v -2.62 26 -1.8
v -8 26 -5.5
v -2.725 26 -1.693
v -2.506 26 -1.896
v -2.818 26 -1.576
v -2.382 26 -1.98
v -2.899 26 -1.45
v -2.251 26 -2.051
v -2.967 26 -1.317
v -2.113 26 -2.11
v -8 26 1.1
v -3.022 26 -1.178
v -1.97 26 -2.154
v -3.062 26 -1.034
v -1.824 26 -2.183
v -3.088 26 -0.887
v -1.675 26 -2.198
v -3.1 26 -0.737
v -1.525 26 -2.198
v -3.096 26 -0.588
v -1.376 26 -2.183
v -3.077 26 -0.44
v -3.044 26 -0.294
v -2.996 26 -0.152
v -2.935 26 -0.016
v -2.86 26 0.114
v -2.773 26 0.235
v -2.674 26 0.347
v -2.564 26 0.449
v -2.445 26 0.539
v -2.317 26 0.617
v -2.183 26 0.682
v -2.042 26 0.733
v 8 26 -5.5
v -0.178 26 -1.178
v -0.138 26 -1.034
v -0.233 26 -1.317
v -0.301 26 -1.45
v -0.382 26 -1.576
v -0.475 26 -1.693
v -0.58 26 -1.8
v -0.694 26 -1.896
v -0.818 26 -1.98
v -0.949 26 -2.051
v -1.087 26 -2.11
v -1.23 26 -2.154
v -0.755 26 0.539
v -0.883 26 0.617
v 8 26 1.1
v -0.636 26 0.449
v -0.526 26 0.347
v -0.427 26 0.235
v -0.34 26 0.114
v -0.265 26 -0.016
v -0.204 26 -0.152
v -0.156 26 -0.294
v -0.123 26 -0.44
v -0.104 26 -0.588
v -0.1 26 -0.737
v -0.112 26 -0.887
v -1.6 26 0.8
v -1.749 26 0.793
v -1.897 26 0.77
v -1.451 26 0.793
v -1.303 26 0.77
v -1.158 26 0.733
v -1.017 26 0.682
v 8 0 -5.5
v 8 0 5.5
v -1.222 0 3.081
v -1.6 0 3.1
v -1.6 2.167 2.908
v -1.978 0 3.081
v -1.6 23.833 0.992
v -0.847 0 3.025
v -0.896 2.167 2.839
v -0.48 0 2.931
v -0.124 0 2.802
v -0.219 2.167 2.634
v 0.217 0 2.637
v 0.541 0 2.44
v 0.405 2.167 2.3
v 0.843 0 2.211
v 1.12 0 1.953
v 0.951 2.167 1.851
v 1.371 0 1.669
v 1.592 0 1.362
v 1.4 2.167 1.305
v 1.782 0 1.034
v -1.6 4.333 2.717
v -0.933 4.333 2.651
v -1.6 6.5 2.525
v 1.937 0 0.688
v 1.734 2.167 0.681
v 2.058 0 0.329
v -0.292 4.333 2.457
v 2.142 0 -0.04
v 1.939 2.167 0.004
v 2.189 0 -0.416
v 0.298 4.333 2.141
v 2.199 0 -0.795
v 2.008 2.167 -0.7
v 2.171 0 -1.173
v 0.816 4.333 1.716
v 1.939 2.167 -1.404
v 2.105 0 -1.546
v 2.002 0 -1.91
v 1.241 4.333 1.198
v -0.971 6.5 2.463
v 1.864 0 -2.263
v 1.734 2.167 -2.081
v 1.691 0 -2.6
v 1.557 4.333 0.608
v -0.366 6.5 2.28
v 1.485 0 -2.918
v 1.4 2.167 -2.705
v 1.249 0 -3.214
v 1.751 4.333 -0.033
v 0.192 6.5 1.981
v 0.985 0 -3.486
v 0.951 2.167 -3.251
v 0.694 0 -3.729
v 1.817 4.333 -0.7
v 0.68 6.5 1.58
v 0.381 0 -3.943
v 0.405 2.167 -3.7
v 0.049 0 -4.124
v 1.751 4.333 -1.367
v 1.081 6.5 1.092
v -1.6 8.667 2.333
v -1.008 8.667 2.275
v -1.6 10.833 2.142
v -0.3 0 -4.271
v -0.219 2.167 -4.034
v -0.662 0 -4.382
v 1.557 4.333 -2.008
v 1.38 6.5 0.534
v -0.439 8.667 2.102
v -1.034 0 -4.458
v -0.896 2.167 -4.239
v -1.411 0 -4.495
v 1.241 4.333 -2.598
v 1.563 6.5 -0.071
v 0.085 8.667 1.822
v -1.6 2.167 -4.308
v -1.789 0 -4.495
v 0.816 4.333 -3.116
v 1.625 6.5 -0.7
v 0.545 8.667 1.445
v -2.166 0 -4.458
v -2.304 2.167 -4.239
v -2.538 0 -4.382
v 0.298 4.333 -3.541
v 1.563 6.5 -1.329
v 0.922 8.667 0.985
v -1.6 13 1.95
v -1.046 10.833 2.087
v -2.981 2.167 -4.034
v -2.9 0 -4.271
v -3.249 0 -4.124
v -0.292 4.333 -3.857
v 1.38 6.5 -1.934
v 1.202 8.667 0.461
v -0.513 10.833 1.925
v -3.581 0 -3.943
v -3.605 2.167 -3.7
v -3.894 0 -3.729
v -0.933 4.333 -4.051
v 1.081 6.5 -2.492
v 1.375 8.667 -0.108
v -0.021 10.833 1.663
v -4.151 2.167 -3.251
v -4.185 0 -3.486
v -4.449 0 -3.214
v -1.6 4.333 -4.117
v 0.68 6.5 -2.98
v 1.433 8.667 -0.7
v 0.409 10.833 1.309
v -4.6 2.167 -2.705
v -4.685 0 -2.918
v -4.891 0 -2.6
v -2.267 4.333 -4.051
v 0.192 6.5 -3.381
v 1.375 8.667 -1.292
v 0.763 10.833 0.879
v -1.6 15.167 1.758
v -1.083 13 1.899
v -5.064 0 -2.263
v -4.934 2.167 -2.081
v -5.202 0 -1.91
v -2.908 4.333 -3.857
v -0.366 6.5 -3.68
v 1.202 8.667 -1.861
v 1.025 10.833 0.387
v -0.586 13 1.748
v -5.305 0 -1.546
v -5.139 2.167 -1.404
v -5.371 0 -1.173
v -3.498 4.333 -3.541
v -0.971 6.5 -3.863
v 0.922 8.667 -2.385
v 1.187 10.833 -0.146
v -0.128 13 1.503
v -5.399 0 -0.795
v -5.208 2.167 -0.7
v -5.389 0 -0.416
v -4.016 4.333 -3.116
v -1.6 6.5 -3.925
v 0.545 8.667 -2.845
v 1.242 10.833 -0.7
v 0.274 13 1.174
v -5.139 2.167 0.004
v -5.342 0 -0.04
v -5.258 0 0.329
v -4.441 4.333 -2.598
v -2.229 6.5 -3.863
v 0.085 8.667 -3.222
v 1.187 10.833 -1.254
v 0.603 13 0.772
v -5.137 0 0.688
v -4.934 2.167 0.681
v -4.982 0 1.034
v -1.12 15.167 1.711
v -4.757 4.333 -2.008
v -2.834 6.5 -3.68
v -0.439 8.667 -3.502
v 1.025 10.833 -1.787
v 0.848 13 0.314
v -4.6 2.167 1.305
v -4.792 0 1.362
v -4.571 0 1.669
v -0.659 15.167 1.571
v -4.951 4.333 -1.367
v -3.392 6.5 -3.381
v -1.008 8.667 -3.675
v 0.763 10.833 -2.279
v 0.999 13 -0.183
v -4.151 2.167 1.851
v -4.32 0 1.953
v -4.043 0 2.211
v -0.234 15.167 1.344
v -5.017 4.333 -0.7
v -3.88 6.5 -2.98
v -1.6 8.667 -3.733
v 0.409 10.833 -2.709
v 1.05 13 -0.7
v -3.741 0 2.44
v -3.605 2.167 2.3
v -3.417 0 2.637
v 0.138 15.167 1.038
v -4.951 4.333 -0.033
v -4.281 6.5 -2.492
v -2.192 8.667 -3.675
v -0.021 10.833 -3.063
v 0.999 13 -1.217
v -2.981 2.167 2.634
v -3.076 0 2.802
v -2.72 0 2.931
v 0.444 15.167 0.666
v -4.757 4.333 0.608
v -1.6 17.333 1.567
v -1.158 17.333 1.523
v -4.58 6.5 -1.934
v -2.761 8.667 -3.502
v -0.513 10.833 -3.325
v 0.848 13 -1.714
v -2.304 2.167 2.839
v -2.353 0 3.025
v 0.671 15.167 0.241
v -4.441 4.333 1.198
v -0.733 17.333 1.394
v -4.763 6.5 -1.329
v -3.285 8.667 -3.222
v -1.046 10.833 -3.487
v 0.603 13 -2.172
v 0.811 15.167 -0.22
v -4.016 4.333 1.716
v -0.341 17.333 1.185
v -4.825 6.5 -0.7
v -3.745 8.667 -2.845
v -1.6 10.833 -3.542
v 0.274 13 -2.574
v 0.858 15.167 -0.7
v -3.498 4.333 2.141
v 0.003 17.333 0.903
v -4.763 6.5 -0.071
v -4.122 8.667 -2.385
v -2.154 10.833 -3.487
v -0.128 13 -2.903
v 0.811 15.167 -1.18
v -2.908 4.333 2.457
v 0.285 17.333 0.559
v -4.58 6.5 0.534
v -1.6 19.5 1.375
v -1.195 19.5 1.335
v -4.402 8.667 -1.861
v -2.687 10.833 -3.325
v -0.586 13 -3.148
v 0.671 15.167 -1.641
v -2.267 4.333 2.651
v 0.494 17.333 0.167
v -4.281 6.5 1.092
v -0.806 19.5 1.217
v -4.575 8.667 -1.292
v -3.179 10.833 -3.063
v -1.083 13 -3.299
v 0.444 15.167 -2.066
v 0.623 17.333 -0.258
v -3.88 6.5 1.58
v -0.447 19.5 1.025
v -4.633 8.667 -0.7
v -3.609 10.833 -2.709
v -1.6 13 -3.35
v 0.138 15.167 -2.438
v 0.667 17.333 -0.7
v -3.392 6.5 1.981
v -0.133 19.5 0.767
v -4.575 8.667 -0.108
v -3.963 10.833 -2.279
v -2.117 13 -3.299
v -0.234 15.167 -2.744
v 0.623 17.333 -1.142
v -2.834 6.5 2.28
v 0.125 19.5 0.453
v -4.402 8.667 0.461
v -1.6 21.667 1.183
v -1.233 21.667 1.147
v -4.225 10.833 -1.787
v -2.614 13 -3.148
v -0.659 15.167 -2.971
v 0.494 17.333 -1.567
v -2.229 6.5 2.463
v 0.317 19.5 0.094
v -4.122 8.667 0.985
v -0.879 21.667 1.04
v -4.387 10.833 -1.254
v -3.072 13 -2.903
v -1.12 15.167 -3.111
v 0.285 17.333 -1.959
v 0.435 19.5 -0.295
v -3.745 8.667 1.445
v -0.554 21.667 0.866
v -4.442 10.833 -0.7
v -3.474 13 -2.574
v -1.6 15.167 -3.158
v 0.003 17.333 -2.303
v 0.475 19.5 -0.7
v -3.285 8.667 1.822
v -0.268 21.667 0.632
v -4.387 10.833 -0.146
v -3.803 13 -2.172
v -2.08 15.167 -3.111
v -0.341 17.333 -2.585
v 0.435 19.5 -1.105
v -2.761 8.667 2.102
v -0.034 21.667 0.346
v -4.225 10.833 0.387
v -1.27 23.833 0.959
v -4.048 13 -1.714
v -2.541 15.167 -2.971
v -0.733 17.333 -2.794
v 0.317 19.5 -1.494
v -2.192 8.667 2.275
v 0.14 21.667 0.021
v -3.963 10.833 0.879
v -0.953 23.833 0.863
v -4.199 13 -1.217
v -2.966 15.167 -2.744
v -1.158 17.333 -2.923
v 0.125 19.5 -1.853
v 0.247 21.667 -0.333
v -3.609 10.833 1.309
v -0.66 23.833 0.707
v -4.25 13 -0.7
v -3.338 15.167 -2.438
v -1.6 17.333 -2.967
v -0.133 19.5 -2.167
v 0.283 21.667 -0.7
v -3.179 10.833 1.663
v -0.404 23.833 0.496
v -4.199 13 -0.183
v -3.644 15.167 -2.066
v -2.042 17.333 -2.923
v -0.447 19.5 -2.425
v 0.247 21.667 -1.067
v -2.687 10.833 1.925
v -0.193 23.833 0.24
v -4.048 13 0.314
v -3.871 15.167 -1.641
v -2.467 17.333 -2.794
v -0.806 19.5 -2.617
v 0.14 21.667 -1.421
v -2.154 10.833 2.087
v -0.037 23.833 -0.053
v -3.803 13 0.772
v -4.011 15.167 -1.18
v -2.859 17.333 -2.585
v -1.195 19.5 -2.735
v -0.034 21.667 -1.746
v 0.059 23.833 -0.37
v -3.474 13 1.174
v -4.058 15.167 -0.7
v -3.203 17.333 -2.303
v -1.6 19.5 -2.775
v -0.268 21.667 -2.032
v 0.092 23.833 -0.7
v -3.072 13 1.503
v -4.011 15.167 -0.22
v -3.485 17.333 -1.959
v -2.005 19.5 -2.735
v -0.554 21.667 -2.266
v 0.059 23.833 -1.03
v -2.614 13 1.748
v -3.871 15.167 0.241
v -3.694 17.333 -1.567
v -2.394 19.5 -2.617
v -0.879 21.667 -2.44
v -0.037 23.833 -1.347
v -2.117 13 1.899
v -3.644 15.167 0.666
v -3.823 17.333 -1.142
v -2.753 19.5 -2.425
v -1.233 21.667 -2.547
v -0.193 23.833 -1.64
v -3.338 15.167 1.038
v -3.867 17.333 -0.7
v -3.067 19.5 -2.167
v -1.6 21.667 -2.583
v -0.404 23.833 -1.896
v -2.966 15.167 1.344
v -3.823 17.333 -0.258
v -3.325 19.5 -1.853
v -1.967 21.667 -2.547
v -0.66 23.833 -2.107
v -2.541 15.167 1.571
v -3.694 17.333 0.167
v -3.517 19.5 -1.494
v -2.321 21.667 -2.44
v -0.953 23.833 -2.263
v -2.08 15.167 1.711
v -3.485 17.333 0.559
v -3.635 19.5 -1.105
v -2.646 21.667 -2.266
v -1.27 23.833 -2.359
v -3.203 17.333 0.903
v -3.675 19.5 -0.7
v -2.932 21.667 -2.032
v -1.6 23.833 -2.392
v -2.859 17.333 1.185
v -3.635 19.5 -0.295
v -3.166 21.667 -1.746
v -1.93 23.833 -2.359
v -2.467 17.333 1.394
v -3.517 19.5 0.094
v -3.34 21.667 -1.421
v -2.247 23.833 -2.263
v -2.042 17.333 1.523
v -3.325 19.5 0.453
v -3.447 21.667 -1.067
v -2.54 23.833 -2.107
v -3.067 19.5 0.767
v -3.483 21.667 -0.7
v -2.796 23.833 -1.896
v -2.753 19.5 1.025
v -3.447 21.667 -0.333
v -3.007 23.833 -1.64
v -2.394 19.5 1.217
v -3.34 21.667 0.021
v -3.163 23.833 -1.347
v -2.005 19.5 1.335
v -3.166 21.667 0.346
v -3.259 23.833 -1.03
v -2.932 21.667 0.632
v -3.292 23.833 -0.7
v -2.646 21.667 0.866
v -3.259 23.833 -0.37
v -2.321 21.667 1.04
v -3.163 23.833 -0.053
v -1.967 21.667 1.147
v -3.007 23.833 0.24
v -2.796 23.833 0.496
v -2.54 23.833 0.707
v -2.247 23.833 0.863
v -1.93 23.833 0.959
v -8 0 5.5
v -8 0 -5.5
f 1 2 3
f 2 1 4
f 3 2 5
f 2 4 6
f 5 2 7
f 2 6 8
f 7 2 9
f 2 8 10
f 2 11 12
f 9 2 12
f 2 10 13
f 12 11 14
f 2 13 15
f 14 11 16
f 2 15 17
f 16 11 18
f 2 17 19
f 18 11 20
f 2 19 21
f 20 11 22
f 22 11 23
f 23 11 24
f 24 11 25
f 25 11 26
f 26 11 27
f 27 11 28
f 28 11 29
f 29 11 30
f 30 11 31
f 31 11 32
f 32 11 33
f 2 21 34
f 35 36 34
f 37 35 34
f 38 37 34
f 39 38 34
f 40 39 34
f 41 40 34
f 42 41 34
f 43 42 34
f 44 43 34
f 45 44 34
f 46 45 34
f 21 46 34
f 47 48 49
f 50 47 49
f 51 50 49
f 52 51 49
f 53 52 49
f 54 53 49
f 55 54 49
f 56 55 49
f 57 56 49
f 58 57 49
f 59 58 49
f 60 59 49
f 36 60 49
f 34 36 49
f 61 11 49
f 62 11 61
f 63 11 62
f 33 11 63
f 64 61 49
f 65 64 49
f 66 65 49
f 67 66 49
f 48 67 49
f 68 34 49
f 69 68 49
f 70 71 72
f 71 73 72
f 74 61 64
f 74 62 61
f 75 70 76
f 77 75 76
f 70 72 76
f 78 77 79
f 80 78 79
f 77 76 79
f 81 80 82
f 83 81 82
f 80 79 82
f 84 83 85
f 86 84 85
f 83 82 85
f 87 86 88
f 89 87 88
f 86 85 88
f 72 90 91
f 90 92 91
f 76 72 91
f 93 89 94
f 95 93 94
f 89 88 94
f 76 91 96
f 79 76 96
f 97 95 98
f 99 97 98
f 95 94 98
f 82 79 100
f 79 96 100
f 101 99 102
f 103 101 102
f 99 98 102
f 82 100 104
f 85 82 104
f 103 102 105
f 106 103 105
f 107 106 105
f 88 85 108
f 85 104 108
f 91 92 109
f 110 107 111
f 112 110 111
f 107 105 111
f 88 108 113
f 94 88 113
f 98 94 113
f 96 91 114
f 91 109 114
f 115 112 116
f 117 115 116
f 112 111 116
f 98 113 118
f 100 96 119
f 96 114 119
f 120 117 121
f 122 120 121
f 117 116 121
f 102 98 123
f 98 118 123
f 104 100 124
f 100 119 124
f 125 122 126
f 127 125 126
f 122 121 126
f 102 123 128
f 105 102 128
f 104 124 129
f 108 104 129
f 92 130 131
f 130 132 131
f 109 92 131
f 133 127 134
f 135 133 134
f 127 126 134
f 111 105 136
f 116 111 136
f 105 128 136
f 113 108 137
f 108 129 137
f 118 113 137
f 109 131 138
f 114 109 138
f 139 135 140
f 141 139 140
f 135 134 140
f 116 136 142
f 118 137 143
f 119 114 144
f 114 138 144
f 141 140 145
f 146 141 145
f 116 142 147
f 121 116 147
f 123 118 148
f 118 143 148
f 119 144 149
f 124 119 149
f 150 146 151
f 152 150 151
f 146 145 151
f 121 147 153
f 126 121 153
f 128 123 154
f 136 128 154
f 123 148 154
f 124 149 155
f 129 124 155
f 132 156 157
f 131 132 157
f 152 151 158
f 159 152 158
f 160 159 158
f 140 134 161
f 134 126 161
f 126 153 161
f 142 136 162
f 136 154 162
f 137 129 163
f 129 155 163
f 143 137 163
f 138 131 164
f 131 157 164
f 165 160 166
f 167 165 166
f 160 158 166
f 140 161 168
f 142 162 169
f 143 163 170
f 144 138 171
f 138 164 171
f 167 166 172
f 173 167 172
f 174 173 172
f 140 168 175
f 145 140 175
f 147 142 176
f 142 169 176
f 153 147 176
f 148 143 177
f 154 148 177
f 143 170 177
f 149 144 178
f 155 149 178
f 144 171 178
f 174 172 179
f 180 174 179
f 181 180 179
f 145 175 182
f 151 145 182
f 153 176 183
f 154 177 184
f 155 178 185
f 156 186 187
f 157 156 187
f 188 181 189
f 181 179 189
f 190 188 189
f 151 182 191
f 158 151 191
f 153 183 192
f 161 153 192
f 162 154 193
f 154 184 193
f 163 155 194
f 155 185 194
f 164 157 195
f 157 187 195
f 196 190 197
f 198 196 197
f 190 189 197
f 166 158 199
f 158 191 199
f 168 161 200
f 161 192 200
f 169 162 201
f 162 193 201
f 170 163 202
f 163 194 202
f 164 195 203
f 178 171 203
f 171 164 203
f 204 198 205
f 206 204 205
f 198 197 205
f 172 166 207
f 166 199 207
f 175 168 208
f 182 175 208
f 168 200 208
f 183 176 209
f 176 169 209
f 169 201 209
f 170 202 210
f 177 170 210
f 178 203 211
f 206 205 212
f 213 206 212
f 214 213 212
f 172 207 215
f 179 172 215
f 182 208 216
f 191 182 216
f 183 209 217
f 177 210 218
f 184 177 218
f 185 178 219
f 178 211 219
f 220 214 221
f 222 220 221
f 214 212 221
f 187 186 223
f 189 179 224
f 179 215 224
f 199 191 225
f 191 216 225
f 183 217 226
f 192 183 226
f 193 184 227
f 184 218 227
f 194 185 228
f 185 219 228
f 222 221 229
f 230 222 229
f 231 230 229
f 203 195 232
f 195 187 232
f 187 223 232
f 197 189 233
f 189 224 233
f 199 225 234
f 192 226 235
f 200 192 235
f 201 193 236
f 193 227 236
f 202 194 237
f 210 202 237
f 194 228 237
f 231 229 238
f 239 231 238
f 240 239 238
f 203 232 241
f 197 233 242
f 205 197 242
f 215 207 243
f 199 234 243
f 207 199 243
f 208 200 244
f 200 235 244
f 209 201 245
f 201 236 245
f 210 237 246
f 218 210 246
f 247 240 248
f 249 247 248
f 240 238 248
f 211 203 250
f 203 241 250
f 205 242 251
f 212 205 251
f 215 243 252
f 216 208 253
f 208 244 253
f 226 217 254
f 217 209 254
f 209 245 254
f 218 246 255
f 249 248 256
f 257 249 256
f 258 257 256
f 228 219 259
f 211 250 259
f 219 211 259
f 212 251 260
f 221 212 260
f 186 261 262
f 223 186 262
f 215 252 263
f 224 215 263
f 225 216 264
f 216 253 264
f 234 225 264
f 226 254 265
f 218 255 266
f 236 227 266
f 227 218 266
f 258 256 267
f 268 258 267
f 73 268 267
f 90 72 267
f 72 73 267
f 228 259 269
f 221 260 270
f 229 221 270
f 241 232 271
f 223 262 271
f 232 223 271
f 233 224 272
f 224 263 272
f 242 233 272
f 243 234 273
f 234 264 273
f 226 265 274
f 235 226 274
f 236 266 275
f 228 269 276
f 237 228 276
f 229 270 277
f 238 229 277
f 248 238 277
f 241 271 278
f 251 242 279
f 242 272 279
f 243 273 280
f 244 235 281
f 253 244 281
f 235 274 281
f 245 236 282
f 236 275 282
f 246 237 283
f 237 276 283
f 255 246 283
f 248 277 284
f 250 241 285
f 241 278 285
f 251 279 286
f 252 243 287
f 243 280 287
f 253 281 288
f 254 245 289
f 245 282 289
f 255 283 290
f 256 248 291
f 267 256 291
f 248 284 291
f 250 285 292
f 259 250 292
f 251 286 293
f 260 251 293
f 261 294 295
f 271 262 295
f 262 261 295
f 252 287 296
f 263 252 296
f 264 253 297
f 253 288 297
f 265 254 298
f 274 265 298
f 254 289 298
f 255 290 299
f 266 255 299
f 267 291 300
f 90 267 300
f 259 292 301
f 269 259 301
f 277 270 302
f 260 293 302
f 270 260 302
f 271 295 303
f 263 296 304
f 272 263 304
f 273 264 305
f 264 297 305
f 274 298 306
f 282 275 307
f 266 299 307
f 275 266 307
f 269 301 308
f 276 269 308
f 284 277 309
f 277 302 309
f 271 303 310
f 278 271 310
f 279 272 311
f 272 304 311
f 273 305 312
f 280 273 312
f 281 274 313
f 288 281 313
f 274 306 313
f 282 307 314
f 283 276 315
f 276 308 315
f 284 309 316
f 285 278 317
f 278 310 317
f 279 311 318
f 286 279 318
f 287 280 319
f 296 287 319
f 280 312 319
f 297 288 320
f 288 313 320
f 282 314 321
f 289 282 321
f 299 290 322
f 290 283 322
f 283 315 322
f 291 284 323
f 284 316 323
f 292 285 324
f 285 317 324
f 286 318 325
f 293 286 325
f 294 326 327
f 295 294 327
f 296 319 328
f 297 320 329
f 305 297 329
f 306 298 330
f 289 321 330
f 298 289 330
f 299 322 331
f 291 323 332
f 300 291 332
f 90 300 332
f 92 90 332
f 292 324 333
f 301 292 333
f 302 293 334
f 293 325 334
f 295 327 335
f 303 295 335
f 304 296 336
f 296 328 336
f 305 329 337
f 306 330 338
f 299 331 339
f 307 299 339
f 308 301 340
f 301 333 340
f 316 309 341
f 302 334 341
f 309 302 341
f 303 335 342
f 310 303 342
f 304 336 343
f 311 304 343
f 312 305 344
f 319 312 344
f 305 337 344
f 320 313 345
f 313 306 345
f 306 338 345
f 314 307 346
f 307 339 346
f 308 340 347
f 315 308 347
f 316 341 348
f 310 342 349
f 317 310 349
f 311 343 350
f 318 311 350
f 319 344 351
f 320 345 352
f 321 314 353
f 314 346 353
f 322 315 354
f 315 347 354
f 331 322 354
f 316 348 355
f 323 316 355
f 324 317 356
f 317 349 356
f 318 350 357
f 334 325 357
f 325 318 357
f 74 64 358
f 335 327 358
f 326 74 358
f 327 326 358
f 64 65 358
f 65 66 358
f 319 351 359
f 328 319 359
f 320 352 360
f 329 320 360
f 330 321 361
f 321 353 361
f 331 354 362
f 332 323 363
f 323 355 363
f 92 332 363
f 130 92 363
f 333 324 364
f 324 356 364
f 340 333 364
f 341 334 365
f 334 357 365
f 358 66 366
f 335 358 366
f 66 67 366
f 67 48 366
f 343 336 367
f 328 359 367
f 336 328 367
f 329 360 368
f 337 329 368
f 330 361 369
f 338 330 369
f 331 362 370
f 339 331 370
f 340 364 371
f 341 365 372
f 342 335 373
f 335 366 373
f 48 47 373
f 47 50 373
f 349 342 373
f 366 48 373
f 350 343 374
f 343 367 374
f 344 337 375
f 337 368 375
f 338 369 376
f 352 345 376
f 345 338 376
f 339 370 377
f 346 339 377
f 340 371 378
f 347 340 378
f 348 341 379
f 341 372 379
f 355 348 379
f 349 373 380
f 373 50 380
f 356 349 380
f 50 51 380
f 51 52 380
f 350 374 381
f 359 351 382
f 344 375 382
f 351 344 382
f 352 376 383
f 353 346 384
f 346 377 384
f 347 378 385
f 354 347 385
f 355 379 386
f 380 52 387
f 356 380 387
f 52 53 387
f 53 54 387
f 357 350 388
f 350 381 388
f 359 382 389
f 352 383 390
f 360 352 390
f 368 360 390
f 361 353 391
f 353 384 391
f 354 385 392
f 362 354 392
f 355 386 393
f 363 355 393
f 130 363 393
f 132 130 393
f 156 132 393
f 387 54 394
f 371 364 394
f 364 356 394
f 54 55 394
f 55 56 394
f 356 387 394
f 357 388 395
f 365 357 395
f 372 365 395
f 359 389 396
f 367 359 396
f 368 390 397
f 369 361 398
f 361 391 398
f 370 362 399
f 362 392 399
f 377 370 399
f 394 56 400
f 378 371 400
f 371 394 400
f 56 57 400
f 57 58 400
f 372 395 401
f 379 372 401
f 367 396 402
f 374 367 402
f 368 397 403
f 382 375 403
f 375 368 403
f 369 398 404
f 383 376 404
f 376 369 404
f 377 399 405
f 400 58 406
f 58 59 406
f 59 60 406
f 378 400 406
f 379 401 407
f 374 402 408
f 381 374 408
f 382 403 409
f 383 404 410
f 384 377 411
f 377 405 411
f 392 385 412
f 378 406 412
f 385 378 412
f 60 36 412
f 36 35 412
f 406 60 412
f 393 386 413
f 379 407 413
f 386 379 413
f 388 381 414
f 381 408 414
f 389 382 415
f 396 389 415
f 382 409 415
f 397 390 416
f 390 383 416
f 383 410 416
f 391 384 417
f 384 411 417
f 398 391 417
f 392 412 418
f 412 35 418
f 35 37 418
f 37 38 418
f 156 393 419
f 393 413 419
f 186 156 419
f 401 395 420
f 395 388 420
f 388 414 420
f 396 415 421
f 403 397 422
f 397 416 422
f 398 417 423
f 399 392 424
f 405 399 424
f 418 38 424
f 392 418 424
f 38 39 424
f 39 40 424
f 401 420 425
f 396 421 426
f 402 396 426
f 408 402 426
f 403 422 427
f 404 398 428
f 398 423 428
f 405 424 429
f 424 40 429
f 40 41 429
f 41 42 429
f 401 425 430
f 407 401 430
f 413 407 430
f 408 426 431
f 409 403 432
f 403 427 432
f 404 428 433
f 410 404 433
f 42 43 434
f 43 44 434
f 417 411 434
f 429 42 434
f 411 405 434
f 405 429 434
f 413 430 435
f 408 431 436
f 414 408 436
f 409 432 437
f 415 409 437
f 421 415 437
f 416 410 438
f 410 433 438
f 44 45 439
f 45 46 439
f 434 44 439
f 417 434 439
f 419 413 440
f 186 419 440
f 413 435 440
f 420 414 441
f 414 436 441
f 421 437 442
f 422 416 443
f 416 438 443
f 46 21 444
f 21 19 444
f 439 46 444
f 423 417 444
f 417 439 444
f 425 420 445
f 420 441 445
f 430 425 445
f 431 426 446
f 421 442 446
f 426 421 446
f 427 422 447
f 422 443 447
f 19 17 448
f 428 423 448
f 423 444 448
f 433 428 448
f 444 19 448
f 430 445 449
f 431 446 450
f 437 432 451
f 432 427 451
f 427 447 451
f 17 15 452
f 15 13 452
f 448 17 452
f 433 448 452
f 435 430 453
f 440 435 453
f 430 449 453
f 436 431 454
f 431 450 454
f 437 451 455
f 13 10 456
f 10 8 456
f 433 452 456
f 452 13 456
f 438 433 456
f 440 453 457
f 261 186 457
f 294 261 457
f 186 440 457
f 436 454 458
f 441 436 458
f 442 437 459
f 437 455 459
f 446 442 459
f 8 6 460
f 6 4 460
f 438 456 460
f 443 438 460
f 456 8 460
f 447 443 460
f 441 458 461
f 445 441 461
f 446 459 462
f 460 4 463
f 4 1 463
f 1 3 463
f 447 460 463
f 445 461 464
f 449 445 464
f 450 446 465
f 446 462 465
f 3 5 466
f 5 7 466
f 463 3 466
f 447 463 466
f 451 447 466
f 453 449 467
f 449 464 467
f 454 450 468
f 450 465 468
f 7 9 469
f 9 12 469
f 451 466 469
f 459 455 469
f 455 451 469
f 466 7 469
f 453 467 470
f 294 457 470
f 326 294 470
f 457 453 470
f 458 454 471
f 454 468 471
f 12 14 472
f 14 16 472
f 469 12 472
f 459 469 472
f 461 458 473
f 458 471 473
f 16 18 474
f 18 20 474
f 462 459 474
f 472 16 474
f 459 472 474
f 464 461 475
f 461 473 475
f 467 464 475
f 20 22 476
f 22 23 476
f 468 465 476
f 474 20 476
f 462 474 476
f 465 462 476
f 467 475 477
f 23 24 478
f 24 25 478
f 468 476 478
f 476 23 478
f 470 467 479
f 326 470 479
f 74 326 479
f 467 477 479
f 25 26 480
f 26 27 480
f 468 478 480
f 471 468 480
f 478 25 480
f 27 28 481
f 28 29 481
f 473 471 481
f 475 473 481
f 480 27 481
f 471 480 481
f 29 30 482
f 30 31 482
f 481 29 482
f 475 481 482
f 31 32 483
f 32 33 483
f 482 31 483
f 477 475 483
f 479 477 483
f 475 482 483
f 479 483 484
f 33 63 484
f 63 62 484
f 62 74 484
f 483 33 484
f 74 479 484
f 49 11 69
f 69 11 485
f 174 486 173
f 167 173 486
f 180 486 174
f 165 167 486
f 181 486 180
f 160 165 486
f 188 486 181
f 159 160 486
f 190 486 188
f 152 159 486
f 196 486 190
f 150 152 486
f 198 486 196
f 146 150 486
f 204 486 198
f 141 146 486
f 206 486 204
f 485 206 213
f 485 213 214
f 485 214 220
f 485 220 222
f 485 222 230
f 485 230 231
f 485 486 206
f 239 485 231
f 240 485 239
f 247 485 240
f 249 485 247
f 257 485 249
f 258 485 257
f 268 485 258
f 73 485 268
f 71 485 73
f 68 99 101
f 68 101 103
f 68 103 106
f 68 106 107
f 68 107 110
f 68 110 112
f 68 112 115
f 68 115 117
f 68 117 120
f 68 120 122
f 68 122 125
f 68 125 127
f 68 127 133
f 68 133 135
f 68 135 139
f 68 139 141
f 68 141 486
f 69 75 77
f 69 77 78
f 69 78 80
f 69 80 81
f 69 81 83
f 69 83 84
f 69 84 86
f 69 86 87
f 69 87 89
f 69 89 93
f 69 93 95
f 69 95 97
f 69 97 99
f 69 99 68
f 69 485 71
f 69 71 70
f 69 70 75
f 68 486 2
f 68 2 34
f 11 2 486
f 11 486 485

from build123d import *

# Parameters (mm, degrees)
F0_W     = 16
F0_H     = 11
F1_DEPTH = 26
F6_DEPTH = 19.82577


with BuildPart() as f1:
    # F0 (on Front) → F1 (new body)
    with BuildSketch(Plane.XZ):
        Rectangle(F0_W, F0_H)
    extrude(amount=-F1_DEPTH)

    # F4 (on offset) → F5 (revolve, cut)
    with BuildSketch(Plane(origin=(-1.6, 0, 0), x_dir=(0, -1, 0), z_dir=(-1, 0, 0))):
        Polygon((-26, -0.7), (0, -0.7), (0, 3.1), (-26, 0.8), align=None)
    revolve(axis=Axis((-1.6, 13, -0.7), (0, 1, 0)), mode=Mode.SUBTRACT)

    # F2 (on face) → F6 (cut)
    with BuildSketch(Plane(origin=(-8, 0, 0), x_dir=(0, -1, 0), z_dir=(-1, 0, 0))):
        Polygon((-26, 5.5), (-26, 1.1), (0, 5.5), align=None)
    extrude(amount=-F6_DEPTH, mode=Mode.SUBTRACT)


solid = f1.part
